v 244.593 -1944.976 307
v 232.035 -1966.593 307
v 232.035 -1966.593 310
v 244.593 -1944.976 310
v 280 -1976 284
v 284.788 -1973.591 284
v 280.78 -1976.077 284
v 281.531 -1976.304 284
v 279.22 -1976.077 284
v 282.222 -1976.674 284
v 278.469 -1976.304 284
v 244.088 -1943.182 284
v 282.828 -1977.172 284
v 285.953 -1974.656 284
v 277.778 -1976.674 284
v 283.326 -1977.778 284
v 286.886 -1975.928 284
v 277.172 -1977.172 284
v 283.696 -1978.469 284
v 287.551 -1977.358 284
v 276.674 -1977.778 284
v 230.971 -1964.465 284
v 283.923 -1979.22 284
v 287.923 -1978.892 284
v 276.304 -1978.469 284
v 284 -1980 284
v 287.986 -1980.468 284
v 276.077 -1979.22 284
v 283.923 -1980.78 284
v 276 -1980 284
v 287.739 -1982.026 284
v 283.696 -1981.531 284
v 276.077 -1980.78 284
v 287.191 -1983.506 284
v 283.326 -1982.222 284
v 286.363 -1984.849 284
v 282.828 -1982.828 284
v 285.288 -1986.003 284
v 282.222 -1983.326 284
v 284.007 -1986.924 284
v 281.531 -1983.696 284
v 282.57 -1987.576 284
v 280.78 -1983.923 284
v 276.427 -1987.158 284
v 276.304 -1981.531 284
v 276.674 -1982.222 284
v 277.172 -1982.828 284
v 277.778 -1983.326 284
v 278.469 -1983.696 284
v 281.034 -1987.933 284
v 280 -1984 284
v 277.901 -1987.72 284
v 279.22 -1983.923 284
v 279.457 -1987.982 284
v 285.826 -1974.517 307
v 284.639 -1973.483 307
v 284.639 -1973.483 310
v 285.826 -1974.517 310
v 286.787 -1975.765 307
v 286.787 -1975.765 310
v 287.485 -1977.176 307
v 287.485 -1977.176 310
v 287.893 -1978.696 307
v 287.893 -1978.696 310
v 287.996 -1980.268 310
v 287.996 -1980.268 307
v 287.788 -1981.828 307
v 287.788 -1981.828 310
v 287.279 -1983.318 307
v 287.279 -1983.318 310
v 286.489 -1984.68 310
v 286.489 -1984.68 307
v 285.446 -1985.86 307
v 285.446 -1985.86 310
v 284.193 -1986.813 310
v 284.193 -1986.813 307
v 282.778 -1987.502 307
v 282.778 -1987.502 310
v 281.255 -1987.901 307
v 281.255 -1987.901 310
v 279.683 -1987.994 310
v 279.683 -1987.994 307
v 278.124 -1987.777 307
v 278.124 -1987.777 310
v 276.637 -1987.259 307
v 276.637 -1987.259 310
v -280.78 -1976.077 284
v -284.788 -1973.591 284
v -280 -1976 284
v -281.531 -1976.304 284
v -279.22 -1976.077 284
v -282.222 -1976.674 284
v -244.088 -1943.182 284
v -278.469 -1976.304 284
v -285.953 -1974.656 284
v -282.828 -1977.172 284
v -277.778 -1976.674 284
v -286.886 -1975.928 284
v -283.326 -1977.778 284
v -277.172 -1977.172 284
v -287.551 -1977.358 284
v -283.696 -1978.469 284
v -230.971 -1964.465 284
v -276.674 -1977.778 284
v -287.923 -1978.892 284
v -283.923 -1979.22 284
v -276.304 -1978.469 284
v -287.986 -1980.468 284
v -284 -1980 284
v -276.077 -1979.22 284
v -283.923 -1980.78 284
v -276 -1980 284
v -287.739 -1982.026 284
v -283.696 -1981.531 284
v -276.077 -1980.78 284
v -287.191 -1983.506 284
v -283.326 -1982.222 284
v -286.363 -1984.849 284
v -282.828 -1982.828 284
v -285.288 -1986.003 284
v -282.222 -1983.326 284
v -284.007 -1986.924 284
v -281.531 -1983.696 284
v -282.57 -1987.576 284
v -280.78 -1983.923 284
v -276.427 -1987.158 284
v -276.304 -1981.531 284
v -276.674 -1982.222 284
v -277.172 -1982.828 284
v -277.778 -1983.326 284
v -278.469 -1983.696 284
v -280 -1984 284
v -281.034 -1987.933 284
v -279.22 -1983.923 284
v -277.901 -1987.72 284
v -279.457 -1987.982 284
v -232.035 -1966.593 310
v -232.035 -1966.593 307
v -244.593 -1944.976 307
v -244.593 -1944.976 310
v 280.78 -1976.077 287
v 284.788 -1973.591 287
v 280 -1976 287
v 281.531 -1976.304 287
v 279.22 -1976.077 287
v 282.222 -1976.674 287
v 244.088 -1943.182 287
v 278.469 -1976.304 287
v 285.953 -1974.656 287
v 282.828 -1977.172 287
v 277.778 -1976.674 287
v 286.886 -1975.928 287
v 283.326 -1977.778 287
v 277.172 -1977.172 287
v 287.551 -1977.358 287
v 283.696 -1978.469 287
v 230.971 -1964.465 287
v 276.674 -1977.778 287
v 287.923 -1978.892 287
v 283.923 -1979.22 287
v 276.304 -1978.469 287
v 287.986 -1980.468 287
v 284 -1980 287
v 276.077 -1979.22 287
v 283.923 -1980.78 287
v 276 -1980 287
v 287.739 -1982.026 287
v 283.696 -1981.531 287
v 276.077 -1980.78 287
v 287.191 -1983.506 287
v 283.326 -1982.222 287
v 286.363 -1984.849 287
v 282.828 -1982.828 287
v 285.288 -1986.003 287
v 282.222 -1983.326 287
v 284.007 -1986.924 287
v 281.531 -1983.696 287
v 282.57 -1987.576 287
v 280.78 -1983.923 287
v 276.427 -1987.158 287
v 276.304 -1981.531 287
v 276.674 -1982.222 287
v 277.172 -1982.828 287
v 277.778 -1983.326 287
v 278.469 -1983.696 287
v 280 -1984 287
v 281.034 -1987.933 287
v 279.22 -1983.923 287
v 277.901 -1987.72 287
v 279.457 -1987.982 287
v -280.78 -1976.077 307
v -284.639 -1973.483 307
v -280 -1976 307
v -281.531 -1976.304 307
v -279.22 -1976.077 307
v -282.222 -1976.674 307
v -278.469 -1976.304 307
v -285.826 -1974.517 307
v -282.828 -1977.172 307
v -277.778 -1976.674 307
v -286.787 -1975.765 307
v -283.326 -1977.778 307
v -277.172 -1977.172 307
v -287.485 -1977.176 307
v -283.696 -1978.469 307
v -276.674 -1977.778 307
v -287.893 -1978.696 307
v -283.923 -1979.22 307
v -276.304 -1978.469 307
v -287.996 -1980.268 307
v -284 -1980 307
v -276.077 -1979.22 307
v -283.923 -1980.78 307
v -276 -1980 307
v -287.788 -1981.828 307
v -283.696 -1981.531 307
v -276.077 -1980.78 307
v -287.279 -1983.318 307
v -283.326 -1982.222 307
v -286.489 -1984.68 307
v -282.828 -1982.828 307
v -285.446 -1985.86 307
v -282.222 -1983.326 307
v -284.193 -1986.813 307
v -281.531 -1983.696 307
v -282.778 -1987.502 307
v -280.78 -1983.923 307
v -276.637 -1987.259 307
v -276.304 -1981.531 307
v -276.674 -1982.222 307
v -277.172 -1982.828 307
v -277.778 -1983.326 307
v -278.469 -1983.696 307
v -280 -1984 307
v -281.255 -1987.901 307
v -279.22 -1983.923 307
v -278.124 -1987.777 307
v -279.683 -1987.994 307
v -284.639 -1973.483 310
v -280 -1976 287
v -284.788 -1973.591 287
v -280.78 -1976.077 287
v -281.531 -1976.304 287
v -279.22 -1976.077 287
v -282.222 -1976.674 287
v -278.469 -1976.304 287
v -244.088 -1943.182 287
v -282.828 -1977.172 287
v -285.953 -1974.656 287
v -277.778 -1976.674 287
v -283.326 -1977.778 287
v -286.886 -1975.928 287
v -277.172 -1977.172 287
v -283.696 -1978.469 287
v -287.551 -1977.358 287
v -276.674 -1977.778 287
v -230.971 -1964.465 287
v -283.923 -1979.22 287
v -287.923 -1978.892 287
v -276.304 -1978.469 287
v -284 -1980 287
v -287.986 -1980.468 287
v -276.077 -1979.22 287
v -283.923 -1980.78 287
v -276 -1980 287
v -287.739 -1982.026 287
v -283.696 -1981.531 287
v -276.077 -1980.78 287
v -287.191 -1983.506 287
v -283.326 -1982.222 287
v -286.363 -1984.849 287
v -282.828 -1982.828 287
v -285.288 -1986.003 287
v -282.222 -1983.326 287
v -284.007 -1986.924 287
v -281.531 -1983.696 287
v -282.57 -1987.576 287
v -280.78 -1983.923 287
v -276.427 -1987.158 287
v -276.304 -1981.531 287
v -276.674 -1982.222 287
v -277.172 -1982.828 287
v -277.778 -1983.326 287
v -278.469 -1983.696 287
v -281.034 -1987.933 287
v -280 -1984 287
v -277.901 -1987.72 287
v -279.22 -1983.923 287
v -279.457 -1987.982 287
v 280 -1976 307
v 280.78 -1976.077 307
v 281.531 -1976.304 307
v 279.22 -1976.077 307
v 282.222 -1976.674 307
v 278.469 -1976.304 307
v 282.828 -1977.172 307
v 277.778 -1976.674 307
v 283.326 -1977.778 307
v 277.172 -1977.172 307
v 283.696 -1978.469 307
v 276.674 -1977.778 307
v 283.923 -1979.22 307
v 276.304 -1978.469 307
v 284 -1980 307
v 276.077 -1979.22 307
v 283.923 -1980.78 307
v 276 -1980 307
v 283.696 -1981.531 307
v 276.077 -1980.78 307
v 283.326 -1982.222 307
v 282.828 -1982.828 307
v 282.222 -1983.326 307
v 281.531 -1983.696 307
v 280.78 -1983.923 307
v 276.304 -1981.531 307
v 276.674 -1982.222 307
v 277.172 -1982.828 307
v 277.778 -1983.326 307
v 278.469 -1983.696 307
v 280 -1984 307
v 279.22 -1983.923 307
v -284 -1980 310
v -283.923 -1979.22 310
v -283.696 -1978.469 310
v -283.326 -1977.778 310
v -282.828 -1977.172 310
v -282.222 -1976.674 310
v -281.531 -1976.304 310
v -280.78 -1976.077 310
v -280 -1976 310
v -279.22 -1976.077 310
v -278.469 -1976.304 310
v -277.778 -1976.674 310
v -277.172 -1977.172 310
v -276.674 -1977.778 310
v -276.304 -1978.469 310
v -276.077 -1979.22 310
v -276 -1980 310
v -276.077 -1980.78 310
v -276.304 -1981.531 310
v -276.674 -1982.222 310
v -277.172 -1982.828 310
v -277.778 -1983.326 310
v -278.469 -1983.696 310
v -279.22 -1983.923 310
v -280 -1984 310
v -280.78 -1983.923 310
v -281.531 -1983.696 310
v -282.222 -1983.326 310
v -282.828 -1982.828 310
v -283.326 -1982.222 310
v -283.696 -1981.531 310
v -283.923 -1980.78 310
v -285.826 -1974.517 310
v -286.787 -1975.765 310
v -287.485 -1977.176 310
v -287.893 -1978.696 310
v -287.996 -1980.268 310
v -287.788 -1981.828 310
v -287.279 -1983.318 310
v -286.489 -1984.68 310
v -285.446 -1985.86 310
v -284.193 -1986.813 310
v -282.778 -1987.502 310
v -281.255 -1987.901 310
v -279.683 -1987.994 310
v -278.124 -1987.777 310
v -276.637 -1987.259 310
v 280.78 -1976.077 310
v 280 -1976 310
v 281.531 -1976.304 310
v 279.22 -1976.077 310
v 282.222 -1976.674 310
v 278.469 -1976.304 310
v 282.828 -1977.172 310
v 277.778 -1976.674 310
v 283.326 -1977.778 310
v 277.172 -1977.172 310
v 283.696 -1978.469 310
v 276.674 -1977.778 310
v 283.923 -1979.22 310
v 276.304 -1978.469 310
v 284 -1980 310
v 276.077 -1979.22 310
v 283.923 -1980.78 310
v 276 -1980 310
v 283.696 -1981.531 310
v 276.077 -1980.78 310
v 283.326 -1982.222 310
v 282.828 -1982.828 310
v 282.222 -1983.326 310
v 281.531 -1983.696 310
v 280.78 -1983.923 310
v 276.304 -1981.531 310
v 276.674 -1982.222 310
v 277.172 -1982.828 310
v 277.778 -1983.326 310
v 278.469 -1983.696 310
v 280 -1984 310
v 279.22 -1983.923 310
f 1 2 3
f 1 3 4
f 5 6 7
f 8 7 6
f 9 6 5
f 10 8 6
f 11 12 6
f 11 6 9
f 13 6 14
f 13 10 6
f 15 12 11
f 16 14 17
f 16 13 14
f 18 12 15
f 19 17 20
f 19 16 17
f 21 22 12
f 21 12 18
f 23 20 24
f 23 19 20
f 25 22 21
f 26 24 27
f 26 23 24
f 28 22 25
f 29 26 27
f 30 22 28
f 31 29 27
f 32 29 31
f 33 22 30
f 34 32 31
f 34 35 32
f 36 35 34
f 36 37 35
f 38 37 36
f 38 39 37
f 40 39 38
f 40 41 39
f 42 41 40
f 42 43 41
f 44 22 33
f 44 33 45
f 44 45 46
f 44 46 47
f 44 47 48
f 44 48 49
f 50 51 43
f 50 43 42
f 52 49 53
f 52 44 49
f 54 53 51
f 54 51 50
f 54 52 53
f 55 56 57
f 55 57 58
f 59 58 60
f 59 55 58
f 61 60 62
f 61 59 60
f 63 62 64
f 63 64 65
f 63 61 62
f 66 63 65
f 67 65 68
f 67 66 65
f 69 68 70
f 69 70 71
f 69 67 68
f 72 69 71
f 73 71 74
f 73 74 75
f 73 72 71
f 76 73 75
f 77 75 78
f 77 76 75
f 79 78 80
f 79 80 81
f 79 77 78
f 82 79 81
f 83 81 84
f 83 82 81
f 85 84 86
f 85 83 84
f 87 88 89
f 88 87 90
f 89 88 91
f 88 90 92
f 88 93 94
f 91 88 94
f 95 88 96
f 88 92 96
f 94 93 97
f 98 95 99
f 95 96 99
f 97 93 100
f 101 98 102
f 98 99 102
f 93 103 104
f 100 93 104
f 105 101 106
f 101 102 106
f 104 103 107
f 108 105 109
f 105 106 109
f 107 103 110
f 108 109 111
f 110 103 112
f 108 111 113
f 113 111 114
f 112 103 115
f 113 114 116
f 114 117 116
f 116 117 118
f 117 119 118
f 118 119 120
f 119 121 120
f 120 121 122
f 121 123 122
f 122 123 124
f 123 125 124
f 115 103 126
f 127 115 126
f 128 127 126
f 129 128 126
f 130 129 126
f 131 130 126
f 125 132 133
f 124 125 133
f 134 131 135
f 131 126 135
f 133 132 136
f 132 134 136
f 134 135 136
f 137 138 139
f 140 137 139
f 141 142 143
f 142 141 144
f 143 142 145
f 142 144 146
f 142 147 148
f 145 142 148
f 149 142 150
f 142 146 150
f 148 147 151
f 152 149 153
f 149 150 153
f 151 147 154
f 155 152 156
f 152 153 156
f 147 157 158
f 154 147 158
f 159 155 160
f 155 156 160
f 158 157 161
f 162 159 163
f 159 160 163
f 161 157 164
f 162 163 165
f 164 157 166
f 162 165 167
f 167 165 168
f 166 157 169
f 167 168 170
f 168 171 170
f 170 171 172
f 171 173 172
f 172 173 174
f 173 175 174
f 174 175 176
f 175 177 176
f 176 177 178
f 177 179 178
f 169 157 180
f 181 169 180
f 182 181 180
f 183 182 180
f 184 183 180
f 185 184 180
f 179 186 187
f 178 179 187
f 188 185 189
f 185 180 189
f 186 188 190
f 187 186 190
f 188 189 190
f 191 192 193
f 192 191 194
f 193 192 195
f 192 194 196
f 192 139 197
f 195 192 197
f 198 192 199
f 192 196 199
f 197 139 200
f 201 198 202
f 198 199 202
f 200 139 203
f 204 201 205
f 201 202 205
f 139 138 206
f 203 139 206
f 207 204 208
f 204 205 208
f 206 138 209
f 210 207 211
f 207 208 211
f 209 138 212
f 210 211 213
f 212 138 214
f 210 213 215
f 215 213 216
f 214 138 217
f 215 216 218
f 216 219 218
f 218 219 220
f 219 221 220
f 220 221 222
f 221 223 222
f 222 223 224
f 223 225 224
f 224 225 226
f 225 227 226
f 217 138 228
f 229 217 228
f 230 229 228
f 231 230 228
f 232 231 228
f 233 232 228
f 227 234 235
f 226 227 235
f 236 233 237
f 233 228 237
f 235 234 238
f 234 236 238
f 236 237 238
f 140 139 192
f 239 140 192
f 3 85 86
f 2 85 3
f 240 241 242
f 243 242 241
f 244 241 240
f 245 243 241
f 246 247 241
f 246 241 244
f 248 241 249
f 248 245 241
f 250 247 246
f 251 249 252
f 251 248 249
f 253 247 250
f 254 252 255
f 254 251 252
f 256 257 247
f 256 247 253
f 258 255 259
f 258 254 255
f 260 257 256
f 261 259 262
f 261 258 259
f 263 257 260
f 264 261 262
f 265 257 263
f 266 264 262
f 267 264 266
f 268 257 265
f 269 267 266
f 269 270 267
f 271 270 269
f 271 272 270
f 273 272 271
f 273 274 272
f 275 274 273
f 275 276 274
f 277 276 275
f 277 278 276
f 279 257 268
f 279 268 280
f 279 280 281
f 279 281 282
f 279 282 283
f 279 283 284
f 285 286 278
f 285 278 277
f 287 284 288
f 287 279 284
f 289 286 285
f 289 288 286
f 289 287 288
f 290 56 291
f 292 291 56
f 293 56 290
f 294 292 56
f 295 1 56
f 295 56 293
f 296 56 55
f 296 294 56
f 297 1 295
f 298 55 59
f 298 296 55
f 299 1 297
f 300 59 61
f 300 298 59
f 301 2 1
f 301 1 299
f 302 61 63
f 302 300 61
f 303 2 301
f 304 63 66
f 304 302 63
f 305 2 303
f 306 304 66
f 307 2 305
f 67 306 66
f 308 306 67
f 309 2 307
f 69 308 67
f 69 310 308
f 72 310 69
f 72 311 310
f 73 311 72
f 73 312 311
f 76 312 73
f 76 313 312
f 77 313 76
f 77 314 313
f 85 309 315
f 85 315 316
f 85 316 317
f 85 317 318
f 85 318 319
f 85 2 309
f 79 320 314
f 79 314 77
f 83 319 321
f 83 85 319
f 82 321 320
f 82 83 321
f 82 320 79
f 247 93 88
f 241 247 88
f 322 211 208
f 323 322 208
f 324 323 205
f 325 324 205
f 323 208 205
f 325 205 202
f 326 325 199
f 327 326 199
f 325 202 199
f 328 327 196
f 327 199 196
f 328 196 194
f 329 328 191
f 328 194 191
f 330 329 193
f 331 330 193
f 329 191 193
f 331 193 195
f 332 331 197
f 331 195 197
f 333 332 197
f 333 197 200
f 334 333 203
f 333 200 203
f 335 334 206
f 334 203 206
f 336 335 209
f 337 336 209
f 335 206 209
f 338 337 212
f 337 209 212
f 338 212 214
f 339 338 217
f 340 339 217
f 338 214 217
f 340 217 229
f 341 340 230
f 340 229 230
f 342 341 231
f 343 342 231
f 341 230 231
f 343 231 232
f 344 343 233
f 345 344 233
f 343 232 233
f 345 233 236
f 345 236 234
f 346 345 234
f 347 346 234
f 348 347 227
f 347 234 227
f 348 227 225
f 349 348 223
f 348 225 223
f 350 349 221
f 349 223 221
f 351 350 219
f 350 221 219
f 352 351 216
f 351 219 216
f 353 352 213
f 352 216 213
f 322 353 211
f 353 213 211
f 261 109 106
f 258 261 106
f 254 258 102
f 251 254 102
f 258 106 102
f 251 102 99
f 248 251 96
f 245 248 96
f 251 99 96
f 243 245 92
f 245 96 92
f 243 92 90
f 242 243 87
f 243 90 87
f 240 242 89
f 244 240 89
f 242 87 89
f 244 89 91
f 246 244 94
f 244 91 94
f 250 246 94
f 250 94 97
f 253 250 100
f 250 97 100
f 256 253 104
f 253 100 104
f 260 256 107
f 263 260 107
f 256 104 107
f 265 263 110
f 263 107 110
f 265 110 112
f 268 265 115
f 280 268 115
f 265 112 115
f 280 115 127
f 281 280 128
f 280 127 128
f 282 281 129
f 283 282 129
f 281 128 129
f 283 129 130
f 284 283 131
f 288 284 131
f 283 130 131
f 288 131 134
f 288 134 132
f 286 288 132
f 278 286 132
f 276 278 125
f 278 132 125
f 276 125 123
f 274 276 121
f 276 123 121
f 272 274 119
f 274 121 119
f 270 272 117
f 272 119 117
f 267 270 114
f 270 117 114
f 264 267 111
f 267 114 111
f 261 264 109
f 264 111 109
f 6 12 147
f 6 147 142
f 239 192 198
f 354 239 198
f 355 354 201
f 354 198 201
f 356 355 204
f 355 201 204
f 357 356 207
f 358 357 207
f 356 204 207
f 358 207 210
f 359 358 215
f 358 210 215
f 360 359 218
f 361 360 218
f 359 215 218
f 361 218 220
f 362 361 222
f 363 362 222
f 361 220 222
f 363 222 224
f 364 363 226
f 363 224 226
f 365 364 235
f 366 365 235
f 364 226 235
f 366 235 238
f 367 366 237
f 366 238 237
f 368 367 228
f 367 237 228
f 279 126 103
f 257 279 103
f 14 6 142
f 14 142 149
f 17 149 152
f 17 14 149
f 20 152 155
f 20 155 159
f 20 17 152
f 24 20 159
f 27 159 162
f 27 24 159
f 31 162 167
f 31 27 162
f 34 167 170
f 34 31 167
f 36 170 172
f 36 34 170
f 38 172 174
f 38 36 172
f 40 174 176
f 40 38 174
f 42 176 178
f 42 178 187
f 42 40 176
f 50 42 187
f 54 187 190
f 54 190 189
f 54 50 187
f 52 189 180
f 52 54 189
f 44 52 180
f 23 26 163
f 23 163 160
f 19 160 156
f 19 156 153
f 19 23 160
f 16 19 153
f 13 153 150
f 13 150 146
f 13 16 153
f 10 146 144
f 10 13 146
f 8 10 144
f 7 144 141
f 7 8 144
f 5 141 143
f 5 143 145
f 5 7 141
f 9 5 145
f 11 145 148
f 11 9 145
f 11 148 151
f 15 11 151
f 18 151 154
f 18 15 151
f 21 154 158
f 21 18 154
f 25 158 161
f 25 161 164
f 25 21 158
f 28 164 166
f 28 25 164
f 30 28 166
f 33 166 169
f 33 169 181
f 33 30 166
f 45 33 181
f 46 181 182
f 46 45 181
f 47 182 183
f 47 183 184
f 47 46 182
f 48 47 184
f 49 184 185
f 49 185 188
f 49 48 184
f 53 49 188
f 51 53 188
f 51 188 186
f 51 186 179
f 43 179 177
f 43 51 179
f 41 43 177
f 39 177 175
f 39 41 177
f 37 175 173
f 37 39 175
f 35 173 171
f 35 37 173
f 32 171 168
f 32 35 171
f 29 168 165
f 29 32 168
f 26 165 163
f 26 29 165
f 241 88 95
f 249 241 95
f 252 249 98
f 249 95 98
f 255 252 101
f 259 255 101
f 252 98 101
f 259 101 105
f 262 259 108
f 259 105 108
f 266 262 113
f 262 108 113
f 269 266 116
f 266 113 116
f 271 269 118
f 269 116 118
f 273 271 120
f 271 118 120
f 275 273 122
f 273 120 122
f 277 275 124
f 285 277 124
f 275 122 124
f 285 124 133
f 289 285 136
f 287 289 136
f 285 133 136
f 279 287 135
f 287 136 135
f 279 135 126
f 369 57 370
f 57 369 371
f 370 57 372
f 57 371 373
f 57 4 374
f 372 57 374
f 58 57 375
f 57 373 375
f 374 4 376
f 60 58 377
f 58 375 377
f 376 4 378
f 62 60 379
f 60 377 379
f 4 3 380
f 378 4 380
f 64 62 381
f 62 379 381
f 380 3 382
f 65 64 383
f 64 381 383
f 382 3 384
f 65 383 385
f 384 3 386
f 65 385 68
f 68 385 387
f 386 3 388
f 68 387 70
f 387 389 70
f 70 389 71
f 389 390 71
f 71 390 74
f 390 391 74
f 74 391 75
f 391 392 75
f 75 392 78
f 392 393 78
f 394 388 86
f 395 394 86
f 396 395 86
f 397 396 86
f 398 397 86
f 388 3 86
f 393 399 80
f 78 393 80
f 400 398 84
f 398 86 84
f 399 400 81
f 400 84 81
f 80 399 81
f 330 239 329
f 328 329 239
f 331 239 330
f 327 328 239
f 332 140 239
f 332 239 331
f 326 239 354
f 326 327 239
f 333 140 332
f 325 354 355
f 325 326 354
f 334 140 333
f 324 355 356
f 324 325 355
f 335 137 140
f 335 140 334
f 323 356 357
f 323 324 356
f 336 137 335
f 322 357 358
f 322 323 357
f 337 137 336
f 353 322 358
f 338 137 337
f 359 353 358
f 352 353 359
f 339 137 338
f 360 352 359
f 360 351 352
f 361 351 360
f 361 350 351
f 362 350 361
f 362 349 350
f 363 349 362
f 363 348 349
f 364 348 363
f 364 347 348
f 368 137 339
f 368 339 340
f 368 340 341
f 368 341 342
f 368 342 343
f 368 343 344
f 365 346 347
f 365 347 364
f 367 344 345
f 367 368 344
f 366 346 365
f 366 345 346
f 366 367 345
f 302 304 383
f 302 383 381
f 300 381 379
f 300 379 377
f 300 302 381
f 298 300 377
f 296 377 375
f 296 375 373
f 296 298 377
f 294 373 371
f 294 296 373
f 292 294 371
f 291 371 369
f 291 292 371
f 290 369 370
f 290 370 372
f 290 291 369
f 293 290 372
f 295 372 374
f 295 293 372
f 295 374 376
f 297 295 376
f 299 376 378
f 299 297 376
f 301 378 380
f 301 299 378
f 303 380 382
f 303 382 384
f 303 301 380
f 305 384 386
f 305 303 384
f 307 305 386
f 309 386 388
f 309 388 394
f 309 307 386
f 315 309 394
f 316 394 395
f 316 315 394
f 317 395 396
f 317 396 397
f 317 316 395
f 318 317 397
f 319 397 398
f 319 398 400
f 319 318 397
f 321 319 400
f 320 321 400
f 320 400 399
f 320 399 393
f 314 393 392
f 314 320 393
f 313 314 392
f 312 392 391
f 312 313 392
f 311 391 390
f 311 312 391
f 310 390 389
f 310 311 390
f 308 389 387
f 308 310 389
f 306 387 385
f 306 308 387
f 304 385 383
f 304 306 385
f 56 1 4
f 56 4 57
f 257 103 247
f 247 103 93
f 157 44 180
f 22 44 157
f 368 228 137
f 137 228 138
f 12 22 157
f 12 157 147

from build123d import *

# Parameters (mm, degrees)
F_3DSKETCH1_R        = 4
BOSS_EXTRUDE_U_DEPTH = 3
BOSS_EXTRUDE_L_START = -3
F_3DSKETCH2_R        = 4
BOSS_EXTRUDE_L_DEPTH = 3


with BuildPart() as part:
    # 3DSketch1 → Boss-Extrude-U (new body)
    with BuildSketch(Plane(origin=(276.636768115, -1987.258696252, 307), x_dir=(-0.6039973468272041, 0.7969863267495234, -3.557491611711546e-14), z_dir=(0, 0, 1))):
        with BuildLine():
            Line((0, 0), (43.409687354, 23.064994864))
            Line((43.409687354, 23.064994864), (53.053649815, 0))
            Line((53.053649815, 0), (6.145824381, -14.698668557))
            ThreePointArc((6.145824381, -14.698668557), (-3.627099829, -10.150751092), (0, 0))
        make_face()
        with Locations(Location((3.753698528, -7.064683104, 0), (0, 0, 232.843273819))):
            Circle(F_3DSKETCH1_R, mode=Mode.SUBTRACT)
    extrude(amount=BOSS_EXTRUDE_U_DEPTH)


with BuildPart() as body_2:
    # 3DSketch2 → Boss-Extrude-L (new body)
    with BuildSketch(Plane(origin=(276.426705148, -1987.157622783, 287), x_dir=(-0.5924370894064002, 0.8056167172394533, -4.372891384724364e-14), z_dir=(0, 0, 1)).offset(BOSS_EXTRUDE_L_START)):
        with BuildLine():
            Line((0, 0), (45.211564112, 23.1759131))
            Line((45.211564112, 23.1759131), (54.58584019, 0))
            Line((54.58584019, 0), (5.975620612, -14.773456946))
            ThreePointArc((5.975620612, -14.773456946), (-3.766944025, -10.118915622), (0, 0))
        make_face()
        with Locations(Location((3.649348167, -7.119147277, 0), (0, 0, 233.669857139))):
            Circle(F_3DSKETCH2_R, mode=Mode.SUBTRACT)
    extrude(amount=BOSS_EXTRUDE_L_DEPTH)


with BuildPart() as body_3:
    # Mirror1: mirrored copy
    add(part.part.mirror(Plane(origin=(0, 0, 0), x_dir=(0, 0, 1), z_dir=(1, 0, 0))))


with BuildPart() as body_4:
    # Mirror1 2: mirrored copy
    add(body_2.part.mirror(Plane(origin=(0, 0, 0), x_dir=(0, 0, 1), z_dir=(1, 0, 0))))


solid = Compound([part.part, body_2.part, body_3.part, body_4.part])
